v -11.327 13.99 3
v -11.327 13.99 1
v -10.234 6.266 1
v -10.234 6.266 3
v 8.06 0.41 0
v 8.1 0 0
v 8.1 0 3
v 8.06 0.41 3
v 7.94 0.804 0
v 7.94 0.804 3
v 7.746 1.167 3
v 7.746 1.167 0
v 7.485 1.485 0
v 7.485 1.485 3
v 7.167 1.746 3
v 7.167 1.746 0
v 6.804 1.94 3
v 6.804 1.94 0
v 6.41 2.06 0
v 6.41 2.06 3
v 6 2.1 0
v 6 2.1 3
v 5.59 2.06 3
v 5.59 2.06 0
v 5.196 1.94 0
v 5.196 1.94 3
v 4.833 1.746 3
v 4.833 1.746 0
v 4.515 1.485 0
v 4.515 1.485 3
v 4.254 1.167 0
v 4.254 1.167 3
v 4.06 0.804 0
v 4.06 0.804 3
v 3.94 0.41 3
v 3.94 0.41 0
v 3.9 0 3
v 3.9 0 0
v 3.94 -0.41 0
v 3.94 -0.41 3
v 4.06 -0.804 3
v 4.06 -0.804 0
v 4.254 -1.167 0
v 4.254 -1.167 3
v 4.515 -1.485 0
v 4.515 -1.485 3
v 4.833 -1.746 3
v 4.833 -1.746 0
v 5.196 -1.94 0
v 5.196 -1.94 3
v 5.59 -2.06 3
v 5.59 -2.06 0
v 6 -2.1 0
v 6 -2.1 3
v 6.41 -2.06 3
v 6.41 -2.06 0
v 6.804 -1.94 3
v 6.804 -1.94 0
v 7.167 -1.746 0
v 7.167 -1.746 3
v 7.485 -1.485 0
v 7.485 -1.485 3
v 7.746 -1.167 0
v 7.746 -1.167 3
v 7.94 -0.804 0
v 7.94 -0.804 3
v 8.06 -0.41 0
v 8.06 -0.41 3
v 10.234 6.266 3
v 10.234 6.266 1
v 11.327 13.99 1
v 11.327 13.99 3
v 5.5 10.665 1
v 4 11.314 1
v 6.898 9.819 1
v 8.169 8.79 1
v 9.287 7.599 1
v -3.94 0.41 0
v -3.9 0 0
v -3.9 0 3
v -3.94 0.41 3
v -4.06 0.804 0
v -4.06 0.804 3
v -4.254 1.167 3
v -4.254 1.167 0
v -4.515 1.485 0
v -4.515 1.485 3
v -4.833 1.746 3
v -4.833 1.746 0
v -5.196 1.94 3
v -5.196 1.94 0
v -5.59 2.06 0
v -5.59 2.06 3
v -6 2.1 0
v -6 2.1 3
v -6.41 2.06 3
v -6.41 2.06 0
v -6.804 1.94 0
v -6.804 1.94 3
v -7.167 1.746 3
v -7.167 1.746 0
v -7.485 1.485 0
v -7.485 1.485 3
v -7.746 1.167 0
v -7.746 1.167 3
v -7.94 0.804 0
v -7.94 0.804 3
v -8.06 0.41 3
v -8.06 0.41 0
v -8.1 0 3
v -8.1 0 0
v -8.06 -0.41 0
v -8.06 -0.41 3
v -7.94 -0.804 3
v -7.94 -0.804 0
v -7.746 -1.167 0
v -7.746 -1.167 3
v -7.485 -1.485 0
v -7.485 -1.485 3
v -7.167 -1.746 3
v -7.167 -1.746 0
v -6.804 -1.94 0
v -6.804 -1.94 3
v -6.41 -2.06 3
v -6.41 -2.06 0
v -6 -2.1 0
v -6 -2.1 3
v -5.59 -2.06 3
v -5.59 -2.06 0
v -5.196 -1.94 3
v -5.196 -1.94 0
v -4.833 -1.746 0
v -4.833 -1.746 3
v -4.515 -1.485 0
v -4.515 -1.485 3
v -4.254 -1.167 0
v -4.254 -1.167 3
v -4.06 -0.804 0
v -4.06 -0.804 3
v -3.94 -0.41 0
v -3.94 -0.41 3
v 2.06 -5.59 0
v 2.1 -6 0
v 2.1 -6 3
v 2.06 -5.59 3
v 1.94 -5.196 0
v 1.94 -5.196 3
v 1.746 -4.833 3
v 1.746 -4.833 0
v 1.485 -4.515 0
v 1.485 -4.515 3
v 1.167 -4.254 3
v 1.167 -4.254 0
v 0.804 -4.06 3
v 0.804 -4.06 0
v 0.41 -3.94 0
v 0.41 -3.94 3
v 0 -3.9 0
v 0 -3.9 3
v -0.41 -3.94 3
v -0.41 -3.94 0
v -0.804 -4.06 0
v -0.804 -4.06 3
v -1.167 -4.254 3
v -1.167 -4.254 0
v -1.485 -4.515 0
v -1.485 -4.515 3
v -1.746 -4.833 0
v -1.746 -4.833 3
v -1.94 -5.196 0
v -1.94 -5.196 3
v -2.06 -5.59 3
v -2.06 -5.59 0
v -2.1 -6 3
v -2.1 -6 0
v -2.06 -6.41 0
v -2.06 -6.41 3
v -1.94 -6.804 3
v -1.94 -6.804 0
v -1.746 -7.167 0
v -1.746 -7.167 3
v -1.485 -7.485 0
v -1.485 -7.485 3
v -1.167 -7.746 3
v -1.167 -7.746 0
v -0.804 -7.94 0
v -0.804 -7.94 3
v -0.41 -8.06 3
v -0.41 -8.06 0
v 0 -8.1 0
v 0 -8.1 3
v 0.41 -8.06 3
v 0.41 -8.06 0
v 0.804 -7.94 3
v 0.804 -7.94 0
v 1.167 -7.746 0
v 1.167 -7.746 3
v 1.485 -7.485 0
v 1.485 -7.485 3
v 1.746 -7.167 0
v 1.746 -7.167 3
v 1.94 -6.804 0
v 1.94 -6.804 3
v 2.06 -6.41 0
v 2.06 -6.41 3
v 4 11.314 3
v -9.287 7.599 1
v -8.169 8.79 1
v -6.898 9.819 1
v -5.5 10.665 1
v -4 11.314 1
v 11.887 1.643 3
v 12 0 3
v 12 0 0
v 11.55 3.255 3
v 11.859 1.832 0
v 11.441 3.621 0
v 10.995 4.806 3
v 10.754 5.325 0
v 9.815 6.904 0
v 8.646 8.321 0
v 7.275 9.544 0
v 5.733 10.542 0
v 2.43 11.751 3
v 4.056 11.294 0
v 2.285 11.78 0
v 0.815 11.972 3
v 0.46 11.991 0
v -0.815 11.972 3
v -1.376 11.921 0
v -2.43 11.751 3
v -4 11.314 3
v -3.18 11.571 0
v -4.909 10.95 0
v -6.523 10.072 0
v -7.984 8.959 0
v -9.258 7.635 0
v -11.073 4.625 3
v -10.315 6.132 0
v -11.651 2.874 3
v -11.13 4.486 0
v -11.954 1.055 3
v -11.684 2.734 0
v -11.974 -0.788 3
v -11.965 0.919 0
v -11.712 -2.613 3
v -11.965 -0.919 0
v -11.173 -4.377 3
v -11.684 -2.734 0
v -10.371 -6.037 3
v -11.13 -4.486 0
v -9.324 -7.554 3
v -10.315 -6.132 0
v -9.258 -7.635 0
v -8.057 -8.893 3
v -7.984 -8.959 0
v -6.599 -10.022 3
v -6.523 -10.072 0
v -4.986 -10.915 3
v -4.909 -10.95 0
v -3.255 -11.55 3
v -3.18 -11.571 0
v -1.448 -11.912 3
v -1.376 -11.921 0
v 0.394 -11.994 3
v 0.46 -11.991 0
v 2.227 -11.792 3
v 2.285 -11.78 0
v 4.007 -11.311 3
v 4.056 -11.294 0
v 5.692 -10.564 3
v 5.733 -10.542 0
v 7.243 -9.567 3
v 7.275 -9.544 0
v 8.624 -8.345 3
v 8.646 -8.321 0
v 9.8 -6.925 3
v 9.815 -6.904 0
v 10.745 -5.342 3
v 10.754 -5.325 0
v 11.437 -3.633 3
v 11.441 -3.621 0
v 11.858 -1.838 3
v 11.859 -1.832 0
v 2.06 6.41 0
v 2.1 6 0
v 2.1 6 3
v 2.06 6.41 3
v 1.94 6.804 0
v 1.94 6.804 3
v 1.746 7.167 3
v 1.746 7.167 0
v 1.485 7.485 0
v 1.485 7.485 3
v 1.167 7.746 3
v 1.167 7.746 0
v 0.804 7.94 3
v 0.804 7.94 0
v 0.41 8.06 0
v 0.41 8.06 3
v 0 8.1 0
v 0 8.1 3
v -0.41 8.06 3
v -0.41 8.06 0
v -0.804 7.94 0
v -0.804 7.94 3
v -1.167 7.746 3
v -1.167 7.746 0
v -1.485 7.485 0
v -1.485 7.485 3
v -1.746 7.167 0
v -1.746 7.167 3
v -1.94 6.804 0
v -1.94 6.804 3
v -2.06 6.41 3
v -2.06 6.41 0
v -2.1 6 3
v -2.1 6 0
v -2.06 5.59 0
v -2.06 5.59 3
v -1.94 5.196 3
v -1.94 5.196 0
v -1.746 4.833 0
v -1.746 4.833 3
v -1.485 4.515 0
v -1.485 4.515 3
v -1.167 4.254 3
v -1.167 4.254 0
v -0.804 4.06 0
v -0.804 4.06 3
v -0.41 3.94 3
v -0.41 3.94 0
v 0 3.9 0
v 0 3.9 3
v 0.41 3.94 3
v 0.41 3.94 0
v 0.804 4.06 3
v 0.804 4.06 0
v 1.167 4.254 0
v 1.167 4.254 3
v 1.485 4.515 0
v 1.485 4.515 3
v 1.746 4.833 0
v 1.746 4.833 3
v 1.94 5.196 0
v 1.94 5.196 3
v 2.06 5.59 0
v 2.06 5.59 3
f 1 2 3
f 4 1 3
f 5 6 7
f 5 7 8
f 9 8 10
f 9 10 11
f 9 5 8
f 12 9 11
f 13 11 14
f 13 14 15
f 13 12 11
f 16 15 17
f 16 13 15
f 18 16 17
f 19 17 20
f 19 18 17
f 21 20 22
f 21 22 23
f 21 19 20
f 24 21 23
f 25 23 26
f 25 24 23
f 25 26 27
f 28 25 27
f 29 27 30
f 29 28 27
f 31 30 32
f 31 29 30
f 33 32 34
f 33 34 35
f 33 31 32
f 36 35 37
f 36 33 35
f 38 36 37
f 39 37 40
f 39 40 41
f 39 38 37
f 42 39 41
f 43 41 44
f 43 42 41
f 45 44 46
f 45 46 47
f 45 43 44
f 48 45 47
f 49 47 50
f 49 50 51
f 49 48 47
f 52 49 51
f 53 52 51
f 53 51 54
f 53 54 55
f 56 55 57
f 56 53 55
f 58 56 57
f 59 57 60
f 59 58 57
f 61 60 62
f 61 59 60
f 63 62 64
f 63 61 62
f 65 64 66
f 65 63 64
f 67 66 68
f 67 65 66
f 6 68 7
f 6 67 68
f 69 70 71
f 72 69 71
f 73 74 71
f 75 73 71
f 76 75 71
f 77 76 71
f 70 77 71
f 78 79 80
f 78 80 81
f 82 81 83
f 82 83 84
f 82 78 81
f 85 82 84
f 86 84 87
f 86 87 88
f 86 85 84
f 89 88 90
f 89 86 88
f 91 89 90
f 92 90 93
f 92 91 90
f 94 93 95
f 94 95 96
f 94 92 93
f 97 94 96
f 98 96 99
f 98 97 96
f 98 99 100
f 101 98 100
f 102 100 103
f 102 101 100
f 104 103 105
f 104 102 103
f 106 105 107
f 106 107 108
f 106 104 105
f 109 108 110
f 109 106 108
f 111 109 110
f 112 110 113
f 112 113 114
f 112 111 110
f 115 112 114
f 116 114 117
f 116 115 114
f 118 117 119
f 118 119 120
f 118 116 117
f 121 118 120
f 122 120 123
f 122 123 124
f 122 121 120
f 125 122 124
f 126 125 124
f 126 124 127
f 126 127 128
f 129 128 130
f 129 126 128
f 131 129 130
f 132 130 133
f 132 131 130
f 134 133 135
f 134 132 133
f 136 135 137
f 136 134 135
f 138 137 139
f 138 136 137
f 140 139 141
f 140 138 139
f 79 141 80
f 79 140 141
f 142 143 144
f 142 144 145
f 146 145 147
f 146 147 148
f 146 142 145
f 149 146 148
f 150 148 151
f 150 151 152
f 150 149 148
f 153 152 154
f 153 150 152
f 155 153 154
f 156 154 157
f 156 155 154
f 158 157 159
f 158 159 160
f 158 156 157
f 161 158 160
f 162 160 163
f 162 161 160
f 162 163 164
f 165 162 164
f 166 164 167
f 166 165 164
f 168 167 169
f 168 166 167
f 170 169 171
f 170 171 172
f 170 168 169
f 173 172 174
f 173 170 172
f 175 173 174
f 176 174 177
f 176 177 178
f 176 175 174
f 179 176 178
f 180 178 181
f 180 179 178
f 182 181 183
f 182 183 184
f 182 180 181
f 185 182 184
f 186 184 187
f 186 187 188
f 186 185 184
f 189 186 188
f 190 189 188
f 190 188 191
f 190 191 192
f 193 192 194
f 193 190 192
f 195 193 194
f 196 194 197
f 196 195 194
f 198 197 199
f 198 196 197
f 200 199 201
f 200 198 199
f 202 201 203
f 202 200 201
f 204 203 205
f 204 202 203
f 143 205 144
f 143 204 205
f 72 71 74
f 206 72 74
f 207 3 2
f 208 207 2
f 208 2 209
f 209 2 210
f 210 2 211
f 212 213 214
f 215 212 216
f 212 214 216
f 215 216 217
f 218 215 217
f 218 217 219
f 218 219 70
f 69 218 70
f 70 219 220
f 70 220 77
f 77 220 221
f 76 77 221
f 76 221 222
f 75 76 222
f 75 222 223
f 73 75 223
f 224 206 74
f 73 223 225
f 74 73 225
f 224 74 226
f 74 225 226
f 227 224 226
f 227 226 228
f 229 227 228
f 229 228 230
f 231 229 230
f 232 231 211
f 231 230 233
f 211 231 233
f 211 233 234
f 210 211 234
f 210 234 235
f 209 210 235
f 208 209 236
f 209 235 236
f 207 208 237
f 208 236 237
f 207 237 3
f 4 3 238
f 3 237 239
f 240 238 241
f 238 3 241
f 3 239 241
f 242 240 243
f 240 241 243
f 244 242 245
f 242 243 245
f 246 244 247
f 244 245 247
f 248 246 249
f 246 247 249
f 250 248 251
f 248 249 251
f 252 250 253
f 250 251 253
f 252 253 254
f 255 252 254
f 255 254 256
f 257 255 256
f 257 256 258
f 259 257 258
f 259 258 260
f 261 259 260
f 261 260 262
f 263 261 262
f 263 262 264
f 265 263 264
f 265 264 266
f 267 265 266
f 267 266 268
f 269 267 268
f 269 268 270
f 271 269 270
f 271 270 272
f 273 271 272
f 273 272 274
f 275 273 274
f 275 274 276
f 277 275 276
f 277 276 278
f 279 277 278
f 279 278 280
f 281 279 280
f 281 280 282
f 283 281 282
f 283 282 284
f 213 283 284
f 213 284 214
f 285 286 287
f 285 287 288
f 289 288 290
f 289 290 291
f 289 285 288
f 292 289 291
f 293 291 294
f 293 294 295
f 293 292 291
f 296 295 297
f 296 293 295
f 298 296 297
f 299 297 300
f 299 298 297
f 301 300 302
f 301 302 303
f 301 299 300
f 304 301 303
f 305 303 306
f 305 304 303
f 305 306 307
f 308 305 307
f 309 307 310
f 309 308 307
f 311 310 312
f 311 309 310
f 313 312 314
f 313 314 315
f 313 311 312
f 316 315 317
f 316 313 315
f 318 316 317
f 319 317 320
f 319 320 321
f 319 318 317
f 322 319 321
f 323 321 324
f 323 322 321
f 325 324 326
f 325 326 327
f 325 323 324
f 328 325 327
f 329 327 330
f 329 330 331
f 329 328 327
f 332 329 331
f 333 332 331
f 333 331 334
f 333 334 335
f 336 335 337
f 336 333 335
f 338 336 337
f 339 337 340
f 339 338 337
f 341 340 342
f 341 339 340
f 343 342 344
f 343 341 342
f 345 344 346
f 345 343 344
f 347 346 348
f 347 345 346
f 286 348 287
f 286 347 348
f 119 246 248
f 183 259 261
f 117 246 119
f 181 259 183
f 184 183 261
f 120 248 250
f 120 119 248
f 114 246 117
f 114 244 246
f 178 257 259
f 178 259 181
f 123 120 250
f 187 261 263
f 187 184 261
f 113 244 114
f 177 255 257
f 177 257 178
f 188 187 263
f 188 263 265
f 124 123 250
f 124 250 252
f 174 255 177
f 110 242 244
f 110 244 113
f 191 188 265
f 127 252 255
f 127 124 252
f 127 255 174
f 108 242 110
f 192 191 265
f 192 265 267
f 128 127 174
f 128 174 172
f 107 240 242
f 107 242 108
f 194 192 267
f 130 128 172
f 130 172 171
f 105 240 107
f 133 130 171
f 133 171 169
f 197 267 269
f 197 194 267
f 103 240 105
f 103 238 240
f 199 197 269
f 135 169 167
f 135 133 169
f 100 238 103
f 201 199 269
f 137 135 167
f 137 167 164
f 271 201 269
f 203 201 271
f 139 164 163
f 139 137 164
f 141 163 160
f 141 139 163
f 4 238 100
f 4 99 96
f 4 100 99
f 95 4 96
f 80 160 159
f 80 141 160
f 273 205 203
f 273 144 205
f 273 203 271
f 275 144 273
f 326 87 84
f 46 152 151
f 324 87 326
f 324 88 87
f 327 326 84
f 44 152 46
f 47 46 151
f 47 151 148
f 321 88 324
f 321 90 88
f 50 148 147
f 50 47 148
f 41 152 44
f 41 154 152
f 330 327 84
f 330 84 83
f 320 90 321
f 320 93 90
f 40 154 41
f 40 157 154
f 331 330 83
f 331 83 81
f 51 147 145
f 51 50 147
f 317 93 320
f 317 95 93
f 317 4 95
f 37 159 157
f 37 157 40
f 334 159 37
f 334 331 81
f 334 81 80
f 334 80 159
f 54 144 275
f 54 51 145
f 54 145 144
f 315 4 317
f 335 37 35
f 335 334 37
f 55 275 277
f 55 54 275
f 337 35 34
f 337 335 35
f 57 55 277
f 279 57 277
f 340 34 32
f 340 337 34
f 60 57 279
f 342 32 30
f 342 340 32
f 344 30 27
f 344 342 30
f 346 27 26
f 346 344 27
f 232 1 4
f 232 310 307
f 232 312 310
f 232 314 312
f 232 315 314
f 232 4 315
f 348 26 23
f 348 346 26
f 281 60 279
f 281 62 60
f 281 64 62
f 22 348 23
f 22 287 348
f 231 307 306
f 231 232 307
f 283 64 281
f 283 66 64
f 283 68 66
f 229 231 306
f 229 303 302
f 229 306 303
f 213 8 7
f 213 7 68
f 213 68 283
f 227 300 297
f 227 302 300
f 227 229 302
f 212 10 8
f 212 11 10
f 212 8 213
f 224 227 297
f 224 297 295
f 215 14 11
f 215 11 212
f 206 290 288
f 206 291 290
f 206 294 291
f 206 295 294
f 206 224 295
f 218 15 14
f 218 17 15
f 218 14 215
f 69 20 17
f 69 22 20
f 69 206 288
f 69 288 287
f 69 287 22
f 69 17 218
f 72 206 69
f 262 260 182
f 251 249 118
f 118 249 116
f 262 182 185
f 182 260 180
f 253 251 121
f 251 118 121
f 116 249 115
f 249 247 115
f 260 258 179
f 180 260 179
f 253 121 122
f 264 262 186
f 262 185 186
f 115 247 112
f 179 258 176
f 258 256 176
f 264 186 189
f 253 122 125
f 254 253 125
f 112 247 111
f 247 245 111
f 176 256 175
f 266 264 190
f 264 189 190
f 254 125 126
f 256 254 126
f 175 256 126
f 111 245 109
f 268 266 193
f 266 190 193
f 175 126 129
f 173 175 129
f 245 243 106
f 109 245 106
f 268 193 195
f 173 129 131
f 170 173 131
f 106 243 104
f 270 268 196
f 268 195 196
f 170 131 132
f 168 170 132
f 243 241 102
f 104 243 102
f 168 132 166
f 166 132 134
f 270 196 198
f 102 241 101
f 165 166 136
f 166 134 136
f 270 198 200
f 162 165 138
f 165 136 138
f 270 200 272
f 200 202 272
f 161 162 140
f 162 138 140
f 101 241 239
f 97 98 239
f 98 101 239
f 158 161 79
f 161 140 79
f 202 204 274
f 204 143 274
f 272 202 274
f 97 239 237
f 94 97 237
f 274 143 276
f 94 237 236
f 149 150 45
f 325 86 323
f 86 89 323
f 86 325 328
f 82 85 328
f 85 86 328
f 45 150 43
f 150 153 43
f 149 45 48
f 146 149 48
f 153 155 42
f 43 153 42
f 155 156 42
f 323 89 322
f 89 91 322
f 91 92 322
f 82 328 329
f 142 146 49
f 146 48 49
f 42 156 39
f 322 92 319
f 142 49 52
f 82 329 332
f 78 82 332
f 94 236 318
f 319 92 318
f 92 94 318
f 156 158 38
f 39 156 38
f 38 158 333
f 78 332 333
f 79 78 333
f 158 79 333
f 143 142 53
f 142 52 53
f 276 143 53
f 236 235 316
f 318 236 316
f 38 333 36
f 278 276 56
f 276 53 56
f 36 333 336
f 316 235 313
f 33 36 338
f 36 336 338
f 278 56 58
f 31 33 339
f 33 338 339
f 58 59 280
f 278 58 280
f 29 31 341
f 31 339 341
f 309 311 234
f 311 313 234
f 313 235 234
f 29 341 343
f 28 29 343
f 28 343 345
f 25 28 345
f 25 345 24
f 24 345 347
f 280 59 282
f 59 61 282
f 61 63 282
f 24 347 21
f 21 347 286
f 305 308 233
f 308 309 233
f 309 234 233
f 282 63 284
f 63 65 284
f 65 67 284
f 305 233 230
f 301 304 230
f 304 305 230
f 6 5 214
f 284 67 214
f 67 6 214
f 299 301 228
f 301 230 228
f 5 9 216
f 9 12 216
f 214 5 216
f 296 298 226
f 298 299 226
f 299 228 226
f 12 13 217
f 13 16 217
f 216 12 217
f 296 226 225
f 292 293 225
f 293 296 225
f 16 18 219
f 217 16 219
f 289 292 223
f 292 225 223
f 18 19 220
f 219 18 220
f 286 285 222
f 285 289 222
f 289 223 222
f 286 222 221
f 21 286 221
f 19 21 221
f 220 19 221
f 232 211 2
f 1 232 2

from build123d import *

# Parameters (mm, degrees)
SKETCH_1_R      = 12
SKETCH_1_R_2    = 2.1
EXTRUDE_1_DEPTH = 3
EXTRUDE_START   = -2
EXTRUDE_2_DEPTH = 2


with BuildPart() as part:
    # 草图1 → 凸台-拉伸1 (new body)
    with BuildSketch(Plane.XY):
        Circle(SKETCH_1_R)
        with Locations((0, 6)):
            Circle(SKETCH_1_R_2, mode=Mode.SUBTRACT)
        with Locations((6, 0)):
            Circle(SKETCH_1_R_2, mode=Mode.SUBTRACT)
        with Locations((0, -6)):
            Circle(SKETCH_1_R_2, mode=Mode.SUBTRACT)
        with Locations((-6, 0)):
            Circle(SKETCH_1_R_2, mode=Mode.SUBTRACT)
    extrude(amount=EXTRUDE_1_DEPTH)

    # 草图2 → 凸台-拉伸2 (add)
    with BuildSketch(Plane.XY.offset(3).offset(EXTRUDE_START)):
        with BuildLine():
            Line((-11.326666422, 13.989518497), (-10.233844137, 6.266453079))
            ThreePointArc((-10.233844137, 6.266453079), (-7.551110948, 9.326345664), (-4, 11.313708499))
            Line((-4, 11.313708499), (-11.326666422, 13.989518497))
        make_face()
        with BuildLine():
            Line((11.326666422, 13.989518497), (4, 11.313708499))
            ThreePointArc((4, 11.313708499), (7.551110948, 9.326345664), (10.233844137, 6.266453079))
            Line((10.233844137, 6.266453079), (11.326666422, 13.989518497))
        make_face()
    extrude(amount=EXTRUDE_2_DEPTH)


solid = part.part
